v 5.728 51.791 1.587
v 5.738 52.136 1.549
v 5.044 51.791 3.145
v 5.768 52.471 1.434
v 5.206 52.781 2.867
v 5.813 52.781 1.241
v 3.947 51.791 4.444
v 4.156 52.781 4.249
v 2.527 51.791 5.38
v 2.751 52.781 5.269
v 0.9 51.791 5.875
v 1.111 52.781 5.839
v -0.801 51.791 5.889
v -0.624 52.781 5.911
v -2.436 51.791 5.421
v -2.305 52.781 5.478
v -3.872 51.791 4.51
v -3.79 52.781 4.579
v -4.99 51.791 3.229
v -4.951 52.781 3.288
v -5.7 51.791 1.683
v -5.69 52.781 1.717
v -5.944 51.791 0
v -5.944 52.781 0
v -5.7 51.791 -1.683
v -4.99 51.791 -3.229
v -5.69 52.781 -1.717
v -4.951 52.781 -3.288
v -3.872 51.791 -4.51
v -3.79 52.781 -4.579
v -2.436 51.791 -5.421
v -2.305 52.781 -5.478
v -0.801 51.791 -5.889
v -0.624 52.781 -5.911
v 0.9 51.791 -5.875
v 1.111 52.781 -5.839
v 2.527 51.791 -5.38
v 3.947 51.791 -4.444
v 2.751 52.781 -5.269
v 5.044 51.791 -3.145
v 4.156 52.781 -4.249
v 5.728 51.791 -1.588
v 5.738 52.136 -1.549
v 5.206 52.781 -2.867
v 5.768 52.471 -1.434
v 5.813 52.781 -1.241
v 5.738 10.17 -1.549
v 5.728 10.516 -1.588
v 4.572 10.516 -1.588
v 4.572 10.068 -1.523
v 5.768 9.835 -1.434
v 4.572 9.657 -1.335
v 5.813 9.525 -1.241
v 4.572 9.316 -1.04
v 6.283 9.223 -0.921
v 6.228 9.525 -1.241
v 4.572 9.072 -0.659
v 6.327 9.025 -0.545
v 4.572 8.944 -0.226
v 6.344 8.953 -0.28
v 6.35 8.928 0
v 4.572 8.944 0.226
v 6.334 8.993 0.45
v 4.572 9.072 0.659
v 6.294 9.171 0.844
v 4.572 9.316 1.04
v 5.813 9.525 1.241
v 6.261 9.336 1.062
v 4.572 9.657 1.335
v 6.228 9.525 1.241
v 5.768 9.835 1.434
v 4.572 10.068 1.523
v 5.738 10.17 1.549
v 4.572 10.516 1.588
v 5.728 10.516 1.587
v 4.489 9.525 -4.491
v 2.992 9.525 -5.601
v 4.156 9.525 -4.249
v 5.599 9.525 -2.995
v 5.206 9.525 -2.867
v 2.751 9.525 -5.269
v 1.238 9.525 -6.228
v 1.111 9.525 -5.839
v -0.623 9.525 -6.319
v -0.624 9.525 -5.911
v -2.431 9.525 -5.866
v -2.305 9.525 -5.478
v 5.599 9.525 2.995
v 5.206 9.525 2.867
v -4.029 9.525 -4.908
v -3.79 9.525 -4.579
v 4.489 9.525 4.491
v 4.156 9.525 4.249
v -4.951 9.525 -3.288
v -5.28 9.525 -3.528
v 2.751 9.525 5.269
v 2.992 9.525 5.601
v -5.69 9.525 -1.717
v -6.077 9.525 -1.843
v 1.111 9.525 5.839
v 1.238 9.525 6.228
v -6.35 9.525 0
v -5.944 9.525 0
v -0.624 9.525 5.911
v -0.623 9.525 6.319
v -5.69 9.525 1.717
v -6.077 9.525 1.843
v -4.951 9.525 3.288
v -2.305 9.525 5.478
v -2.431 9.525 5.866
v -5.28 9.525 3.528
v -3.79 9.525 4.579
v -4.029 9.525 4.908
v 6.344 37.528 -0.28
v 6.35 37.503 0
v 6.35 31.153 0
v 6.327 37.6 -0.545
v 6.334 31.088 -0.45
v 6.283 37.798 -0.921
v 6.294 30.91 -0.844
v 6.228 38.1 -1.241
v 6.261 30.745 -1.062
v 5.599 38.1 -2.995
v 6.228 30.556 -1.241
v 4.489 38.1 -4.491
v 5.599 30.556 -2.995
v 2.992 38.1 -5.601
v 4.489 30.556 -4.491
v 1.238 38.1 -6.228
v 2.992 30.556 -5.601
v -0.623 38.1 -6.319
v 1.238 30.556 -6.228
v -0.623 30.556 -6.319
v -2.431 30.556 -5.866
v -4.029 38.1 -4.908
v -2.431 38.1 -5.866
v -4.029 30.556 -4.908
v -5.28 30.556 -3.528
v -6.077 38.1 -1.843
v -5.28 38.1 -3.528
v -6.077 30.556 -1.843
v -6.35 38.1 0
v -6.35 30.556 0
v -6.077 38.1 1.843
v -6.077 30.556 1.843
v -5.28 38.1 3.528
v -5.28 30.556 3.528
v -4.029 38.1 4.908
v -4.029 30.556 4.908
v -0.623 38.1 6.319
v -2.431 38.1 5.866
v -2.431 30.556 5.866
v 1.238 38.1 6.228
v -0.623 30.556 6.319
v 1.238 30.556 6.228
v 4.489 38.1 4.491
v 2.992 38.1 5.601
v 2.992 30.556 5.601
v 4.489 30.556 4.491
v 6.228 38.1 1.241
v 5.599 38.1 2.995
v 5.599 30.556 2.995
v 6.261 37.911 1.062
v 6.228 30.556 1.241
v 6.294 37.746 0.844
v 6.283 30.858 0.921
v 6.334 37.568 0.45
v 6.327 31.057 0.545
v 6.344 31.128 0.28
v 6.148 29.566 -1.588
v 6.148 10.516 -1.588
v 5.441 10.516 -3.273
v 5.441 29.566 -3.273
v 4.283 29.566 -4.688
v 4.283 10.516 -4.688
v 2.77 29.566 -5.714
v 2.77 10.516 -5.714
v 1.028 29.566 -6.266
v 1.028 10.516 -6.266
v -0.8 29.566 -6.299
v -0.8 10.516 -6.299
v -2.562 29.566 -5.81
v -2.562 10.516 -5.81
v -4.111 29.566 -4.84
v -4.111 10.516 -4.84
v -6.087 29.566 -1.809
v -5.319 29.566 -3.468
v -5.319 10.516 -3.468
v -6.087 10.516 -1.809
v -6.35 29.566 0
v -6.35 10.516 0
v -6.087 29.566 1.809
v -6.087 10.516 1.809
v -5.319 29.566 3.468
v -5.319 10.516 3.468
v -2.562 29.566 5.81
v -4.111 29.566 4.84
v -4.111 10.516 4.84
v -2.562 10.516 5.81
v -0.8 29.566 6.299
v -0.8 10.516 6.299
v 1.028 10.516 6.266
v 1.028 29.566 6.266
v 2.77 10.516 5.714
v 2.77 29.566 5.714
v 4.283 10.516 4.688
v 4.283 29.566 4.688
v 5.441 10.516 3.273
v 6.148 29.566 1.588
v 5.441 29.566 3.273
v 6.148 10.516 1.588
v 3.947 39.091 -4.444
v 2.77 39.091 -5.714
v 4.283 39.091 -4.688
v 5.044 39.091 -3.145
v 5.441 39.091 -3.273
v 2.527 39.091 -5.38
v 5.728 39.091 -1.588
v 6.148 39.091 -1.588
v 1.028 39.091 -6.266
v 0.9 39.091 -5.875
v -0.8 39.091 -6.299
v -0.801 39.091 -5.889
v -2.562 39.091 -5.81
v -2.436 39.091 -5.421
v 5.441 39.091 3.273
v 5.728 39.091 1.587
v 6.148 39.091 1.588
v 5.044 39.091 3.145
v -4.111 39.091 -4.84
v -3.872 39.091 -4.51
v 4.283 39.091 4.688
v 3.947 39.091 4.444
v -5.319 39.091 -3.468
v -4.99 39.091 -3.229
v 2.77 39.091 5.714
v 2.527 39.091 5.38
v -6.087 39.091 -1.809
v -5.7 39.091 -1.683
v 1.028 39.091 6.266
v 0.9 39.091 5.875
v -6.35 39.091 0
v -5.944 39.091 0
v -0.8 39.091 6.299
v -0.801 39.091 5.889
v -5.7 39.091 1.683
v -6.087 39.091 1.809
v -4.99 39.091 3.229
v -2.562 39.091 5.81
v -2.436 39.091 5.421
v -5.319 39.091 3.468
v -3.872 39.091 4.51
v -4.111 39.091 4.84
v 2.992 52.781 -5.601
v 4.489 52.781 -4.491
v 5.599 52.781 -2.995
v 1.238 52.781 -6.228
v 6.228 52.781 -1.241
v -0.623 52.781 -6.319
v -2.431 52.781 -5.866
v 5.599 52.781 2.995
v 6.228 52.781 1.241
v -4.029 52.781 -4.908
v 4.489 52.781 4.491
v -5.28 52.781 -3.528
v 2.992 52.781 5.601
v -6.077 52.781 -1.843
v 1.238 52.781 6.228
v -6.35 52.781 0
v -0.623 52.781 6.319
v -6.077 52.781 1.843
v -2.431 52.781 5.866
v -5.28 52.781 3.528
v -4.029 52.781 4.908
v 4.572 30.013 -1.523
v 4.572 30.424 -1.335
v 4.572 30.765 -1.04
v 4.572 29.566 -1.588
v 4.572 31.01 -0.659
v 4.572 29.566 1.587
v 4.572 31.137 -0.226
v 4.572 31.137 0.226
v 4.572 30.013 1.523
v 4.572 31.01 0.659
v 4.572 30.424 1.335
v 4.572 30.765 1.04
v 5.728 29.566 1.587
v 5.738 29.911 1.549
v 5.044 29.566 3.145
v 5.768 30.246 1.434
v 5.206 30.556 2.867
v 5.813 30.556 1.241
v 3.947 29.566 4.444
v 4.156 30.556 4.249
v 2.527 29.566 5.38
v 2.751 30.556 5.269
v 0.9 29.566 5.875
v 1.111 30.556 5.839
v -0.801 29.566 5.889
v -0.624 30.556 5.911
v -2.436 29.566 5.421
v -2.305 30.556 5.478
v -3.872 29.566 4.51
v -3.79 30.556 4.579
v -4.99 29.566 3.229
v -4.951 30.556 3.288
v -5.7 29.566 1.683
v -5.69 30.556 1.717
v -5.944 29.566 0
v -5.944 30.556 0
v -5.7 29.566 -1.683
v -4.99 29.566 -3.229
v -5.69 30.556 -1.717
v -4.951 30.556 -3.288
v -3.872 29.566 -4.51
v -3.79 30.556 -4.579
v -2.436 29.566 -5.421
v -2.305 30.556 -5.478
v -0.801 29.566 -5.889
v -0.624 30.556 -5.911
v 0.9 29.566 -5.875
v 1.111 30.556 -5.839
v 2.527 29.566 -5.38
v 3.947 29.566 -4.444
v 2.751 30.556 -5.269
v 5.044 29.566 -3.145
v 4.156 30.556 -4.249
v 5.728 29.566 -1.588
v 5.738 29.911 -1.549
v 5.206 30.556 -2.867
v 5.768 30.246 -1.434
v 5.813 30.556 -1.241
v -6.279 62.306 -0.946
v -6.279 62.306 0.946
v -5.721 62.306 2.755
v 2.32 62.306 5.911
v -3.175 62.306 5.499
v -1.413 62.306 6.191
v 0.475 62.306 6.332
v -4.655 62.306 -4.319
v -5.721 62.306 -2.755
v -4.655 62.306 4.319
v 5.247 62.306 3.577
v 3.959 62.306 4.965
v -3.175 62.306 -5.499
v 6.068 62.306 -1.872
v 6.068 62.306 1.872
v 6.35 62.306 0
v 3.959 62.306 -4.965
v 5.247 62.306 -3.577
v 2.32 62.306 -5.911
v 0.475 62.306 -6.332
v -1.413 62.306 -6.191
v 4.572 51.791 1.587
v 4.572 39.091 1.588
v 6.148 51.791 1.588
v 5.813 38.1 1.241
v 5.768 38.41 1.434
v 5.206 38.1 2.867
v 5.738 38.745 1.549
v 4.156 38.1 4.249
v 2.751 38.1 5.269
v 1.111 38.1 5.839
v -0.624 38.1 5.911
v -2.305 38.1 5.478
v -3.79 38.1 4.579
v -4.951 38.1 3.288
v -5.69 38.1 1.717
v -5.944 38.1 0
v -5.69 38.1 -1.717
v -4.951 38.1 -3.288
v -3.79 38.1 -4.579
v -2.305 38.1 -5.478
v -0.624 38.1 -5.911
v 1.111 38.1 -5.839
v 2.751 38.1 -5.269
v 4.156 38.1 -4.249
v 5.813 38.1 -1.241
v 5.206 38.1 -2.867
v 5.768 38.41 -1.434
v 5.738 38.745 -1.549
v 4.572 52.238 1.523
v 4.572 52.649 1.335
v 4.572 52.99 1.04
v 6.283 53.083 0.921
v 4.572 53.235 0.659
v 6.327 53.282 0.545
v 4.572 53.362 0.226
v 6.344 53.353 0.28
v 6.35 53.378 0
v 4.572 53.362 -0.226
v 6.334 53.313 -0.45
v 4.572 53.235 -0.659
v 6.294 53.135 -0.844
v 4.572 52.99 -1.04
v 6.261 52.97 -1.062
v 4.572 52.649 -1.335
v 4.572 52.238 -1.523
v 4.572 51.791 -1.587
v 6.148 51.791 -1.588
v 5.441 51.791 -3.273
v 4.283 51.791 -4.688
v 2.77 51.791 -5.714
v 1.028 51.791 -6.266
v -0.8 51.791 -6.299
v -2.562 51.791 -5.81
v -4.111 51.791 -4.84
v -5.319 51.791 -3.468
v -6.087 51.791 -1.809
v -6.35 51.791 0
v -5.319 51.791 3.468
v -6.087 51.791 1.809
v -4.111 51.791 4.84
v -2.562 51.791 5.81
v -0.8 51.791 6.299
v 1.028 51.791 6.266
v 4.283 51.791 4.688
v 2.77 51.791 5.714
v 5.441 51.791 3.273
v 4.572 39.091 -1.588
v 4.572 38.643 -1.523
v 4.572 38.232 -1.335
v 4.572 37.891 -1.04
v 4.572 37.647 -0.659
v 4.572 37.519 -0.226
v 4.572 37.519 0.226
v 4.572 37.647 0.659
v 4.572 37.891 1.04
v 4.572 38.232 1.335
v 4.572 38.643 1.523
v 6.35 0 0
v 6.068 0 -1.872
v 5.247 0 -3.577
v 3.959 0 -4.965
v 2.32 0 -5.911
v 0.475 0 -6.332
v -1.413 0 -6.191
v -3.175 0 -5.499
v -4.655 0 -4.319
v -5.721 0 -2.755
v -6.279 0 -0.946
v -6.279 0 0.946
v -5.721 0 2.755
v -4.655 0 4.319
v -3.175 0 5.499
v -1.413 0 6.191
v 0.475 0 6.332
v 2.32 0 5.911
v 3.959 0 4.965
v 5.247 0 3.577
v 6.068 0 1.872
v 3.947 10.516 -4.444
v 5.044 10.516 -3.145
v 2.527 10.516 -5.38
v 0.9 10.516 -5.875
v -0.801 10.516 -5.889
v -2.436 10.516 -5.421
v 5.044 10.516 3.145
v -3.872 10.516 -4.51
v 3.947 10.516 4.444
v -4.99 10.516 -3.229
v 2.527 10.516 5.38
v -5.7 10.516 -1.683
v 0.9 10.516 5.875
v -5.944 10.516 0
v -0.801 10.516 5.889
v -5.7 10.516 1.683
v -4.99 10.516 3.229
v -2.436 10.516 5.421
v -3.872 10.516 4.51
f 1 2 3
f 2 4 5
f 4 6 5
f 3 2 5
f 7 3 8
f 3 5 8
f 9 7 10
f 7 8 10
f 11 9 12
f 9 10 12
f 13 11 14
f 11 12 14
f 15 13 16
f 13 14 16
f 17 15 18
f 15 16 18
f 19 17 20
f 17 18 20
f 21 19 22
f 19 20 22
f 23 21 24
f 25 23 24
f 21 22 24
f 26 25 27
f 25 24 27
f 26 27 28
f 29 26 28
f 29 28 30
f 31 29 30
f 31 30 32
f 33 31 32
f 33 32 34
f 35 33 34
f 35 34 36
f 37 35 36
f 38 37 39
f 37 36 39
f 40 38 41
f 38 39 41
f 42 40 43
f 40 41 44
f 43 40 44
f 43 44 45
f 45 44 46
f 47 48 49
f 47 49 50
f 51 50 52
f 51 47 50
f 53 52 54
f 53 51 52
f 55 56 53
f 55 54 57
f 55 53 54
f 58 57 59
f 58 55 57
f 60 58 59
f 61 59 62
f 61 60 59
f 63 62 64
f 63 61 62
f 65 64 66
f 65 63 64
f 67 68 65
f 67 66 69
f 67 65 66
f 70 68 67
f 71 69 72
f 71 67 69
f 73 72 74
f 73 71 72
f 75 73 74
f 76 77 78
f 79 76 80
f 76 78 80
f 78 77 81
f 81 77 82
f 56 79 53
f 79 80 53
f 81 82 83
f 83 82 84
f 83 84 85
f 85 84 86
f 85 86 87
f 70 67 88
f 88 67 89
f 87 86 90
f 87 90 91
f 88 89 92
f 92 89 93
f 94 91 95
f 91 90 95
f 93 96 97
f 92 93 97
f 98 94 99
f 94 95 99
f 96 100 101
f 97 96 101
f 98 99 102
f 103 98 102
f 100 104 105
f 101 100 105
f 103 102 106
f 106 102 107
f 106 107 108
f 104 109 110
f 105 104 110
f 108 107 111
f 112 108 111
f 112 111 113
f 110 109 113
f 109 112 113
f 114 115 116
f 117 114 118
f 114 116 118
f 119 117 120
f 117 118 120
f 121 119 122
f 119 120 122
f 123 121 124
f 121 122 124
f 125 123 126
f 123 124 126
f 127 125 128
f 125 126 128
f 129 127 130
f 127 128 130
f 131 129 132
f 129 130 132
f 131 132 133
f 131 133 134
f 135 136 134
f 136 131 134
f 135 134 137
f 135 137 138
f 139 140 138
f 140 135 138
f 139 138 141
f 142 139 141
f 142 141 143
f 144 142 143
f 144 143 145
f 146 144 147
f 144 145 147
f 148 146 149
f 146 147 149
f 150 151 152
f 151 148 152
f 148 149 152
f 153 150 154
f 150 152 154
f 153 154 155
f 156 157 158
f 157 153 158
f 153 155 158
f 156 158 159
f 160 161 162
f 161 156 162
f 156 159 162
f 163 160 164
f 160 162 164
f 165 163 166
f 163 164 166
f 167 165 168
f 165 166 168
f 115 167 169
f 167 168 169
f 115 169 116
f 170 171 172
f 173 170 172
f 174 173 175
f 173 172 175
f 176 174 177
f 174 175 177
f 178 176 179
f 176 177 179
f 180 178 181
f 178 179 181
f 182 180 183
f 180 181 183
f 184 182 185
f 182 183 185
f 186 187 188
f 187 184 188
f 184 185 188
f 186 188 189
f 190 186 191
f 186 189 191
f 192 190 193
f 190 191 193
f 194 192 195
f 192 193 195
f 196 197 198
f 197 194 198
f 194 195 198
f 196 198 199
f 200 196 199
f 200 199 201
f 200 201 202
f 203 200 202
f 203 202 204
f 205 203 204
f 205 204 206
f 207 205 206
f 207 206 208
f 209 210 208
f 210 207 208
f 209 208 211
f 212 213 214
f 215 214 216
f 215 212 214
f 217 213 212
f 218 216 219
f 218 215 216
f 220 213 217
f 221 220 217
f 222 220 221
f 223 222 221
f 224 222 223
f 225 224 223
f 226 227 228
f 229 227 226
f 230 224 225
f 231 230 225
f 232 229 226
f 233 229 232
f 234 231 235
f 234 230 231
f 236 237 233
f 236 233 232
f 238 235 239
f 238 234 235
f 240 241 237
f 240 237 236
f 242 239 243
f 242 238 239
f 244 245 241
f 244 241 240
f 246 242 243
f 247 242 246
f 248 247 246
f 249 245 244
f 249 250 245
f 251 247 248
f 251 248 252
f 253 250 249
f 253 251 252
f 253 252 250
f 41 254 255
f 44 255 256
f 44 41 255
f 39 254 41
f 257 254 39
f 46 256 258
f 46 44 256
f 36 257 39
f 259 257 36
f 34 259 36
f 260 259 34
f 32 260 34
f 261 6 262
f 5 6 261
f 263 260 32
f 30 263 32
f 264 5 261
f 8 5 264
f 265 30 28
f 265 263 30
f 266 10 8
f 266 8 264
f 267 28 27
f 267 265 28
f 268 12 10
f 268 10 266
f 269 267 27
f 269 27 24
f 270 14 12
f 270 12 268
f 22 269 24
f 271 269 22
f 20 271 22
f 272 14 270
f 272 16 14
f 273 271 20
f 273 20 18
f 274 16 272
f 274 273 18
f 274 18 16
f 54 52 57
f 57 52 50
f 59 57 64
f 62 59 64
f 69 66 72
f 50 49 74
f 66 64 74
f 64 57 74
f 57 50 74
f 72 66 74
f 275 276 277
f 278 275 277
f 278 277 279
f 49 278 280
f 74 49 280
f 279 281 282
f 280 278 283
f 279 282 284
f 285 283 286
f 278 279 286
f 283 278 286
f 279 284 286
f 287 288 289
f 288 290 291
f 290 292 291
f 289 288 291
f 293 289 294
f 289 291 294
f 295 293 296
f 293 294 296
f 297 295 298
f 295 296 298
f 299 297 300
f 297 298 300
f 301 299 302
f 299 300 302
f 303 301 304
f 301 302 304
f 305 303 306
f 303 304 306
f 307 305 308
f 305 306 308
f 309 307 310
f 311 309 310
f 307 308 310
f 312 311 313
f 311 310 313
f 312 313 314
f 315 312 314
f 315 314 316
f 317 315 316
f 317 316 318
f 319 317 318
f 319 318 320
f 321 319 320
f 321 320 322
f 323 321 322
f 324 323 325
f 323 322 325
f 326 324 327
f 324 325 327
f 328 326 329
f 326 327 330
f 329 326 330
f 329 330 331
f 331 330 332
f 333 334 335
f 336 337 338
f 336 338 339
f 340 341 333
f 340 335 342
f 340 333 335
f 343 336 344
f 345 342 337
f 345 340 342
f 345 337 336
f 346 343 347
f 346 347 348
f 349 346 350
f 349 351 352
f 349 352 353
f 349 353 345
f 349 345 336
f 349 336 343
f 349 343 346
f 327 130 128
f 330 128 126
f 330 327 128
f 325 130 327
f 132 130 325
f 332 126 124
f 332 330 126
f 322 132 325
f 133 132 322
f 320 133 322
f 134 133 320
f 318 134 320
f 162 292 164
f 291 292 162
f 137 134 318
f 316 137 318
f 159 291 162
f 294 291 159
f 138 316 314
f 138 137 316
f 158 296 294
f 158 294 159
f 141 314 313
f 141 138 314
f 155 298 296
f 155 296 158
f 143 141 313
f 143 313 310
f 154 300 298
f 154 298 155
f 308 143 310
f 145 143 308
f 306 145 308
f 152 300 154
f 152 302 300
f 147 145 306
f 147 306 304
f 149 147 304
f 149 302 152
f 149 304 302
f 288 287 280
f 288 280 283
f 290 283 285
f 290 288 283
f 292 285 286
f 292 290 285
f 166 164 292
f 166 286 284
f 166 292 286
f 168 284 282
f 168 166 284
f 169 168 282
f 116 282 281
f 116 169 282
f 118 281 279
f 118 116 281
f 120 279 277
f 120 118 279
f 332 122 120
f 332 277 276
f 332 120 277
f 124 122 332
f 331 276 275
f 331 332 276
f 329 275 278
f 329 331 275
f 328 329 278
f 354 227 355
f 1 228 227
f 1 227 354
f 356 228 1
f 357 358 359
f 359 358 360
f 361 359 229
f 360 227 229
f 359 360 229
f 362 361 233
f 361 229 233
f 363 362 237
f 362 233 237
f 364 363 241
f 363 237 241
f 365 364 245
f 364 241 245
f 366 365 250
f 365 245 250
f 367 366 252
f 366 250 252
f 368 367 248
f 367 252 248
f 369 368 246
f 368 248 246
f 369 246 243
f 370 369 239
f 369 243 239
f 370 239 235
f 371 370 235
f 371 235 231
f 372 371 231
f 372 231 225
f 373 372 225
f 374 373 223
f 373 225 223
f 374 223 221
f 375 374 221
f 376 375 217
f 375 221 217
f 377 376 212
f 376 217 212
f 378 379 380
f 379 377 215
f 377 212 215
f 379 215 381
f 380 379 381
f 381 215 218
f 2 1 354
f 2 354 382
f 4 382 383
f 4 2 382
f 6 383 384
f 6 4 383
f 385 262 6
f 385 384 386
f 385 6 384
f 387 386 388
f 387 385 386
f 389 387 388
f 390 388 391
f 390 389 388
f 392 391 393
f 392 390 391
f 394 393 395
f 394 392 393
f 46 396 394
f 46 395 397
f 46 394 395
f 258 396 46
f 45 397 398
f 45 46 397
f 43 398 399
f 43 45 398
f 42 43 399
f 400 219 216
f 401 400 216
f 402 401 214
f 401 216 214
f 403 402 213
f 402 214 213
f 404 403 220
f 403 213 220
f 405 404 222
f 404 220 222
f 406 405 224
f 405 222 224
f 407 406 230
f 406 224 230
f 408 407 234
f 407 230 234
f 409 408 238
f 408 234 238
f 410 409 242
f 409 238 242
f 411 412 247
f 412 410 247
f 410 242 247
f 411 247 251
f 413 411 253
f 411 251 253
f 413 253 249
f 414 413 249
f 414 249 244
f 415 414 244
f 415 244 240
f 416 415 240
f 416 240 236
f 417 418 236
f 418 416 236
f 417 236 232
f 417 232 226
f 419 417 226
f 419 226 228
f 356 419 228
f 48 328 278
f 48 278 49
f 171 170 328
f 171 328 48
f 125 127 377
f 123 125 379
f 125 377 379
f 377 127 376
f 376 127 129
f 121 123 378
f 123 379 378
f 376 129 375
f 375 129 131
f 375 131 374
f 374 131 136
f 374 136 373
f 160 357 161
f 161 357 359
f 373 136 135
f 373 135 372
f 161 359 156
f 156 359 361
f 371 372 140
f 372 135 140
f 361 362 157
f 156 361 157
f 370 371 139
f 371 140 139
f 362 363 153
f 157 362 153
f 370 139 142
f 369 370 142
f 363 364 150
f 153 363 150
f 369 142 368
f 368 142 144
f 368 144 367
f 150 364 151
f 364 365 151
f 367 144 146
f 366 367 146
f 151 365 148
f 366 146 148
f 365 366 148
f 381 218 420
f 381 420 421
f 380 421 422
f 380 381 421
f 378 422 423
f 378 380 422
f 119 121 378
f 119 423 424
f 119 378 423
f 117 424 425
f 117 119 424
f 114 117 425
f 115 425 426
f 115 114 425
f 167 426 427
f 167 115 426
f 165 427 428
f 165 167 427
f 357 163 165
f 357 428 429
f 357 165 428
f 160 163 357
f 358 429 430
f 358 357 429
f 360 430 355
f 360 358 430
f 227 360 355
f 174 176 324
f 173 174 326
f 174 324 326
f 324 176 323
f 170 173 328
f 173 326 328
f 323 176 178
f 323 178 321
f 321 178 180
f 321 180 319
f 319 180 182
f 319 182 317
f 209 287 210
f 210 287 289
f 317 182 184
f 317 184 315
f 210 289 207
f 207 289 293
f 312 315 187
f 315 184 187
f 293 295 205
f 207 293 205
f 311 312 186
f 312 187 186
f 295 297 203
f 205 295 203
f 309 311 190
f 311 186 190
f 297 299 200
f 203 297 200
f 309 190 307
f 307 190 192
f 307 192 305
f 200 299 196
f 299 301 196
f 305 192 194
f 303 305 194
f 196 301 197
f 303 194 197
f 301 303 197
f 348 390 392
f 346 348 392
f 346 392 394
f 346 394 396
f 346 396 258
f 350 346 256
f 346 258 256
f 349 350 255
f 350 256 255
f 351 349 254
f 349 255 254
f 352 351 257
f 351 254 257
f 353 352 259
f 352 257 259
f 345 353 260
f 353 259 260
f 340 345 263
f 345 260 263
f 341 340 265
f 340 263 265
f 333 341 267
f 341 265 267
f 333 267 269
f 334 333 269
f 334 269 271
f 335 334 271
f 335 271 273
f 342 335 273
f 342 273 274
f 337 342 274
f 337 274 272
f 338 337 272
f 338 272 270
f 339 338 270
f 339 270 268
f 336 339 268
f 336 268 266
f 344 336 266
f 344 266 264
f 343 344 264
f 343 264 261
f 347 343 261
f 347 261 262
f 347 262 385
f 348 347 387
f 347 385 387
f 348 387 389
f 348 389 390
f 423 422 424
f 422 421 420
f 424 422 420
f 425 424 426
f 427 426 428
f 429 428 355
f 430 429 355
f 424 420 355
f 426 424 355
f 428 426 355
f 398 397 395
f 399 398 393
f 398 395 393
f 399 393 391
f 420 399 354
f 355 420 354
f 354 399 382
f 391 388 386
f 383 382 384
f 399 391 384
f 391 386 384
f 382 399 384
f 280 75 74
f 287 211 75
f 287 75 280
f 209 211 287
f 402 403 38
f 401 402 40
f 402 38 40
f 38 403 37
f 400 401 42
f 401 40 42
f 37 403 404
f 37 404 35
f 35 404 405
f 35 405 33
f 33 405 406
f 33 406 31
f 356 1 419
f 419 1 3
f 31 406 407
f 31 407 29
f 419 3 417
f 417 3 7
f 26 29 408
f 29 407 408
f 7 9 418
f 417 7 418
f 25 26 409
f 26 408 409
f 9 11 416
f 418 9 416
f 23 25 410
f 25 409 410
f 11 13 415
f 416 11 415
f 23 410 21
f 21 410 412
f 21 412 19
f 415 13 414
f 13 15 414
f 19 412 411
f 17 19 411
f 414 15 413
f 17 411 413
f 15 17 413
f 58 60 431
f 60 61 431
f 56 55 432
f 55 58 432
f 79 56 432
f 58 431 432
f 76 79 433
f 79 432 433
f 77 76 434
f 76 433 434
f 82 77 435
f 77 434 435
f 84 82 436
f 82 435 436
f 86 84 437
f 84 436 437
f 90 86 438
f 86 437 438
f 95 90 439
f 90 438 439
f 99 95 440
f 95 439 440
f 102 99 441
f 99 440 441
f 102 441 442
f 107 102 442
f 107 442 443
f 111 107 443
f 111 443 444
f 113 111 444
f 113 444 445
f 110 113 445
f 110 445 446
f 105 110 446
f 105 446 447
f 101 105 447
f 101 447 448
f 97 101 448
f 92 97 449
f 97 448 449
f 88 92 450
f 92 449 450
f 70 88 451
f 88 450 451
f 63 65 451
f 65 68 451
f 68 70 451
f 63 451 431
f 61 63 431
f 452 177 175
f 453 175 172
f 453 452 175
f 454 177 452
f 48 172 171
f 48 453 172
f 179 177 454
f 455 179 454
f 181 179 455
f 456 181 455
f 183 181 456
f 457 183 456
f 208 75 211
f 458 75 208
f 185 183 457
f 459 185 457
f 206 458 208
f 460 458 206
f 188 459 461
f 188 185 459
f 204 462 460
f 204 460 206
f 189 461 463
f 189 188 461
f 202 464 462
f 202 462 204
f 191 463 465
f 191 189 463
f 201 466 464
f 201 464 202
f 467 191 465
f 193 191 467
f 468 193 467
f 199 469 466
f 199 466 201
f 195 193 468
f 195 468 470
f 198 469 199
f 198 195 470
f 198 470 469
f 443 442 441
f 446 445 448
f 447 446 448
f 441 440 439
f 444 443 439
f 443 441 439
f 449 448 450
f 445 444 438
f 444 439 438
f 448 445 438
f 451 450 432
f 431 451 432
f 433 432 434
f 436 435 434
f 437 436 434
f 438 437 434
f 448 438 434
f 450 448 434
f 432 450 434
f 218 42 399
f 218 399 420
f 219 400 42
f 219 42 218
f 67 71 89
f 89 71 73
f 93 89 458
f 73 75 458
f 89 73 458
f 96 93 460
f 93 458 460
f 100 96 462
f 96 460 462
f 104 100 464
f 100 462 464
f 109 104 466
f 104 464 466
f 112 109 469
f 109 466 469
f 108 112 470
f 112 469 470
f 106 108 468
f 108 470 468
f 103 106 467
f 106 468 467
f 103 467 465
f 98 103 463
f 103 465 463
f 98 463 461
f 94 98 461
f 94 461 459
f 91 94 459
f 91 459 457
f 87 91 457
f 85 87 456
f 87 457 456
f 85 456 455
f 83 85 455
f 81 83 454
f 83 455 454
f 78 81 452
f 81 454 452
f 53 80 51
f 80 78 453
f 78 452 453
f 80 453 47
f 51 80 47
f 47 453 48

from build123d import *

# Parameters (mm, degrees)
SKETCH1_R           = 6.35
BOSS_EXTRUDE1_DEPTH = 62.3062
SKETCH2_W           = 25.005940549
SKETCH2_H           = 0.9906
SKETCH3_W           = 23.546175461
SKETCH3_H           = 0.9906
SKETCH4_W           = 18.658380353
SKETCH4_H           = 0.9906
SKETCH5_W           = 21.890491914
SKETCH5_H           = 0.9906
CUT_EXTRUDE1_DEPTH  = 1.778
CUT_EXTRUDE2_DEPTH  = 1.778


with BuildPart() as part:
    # Sketch1 → Boss-Extrude1 (new body)
    with BuildSketch(Plane(origin=(0, 0, 0), x_dir=(1, 0, 0), z_dir=(0, 1, 0))):
        Circle(SKETCH1_R)
    extrude(amount=BOSS_EXTRUDE1_DEPTH)

    # Sketch2 → Cut-Revolve1 (revolve, cut)
    with BuildSketch(Plane(origin=(0, 0, 0), x_dir=(0, 0, -1), z_dir=(1, 0, 0))):
        with Locations((-18.446570275, 52.2859)):
            Rectangle(SKETCH2_W, SKETCH2_H)
    revolve(axis=Axis((0, 57.347973558, 0), (0, -1, 0)), mode=Mode.SUBTRACT)

    # Sketch3 → Cut-Revolve2 (revolve, cut)
    with BuildSketch(Plane(origin=(0, 0, 0), x_dir=(0, 0, -1), z_dir=(1, 0, 0))):
        with Locations((-17.71668773, 38.5953)):
            Rectangle(SKETCH3_W, SKETCH3_H)
    revolve(axis=Axis((0, 44.893049612, 0), (0, -1, 0)), mode=Mode.SUBTRACT)

    # Sketch4 → Cut-Revolve3 (revolve, cut)
    with BuildSketch(Plane(origin=(0, 0, 0), x_dir=(0, 0, -1), z_dir=(1, 0, 0))):
        with Locations((-15.272790177, 30.0609)):
            Rectangle(SKETCH4_W, SKETCH4_H)
    revolve(axis=Axis((0, 32.886405358, 0), (0, -1, 0)), mode=Mode.SUBTRACT)

    # Sketch5 → Cut-Revolve4 (revolve, cut)
    with BuildSketch(Plane(origin=(0, 0, 0), x_dir=(0, 0, -1), z_dir=(1, 0, 0))):
        with Locations((-16.888845957, 10.0203)):
            Rectangle(SKETCH5_W, SKETCH5_H)
    revolve(axis=Axis((0, 12.888921404, 0), (0, -1, 0)), mode=Mode.SUBTRACT)

    # Sketch6 → Cut-Extrude1 (cut)
    with BuildSketch(Plane(origin=(6.35, 0, 0), x_dir=(0, 0, -1), z_dir=(1, 0, 0))):
        with BuildLine():
            Line((1.5875, 51.7906), (1.5875, 39.0906))
            ThreePointArc((1.5875, 39.0906), (0, 37.5031), (-1.5875, 39.0906))
            Line((-1.5875, 39.0906), (-1.5875, 51.7906))
            ThreePointArc((-1.5875, 51.7906), (0, 53.3781), (1.5875, 51.7906))
        make_face()
    extrude(amount=-CUT_EXTRUDE1_DEPTH, mode=Mode.SUBTRACT)

    # Sketch7 → Cut-Extrude2 (cut)
    with BuildSketch(Plane(origin=(6.35, 0, 0), x_dir=(0, 0, -1), z_dir=(1, 0, 0))):
        with BuildLine():
            Line((1.5875, 29.5656), (1.5875, 10.5156))
            ThreePointArc((1.5875, 10.5156), (0, 8.9281), (-1.5875, 10.5156))
            Line((-1.5875, 10.5156), (-1.5875, 29.5656))
            ThreePointArc((-1.5875, 29.5656), (0, 31.1531), (1.5875, 29.5656))
        make_face()
    extrude(amount=-CUT_EXTRUDE2_DEPTH, mode=Mode.SUBTRACT)


solid = part.part
